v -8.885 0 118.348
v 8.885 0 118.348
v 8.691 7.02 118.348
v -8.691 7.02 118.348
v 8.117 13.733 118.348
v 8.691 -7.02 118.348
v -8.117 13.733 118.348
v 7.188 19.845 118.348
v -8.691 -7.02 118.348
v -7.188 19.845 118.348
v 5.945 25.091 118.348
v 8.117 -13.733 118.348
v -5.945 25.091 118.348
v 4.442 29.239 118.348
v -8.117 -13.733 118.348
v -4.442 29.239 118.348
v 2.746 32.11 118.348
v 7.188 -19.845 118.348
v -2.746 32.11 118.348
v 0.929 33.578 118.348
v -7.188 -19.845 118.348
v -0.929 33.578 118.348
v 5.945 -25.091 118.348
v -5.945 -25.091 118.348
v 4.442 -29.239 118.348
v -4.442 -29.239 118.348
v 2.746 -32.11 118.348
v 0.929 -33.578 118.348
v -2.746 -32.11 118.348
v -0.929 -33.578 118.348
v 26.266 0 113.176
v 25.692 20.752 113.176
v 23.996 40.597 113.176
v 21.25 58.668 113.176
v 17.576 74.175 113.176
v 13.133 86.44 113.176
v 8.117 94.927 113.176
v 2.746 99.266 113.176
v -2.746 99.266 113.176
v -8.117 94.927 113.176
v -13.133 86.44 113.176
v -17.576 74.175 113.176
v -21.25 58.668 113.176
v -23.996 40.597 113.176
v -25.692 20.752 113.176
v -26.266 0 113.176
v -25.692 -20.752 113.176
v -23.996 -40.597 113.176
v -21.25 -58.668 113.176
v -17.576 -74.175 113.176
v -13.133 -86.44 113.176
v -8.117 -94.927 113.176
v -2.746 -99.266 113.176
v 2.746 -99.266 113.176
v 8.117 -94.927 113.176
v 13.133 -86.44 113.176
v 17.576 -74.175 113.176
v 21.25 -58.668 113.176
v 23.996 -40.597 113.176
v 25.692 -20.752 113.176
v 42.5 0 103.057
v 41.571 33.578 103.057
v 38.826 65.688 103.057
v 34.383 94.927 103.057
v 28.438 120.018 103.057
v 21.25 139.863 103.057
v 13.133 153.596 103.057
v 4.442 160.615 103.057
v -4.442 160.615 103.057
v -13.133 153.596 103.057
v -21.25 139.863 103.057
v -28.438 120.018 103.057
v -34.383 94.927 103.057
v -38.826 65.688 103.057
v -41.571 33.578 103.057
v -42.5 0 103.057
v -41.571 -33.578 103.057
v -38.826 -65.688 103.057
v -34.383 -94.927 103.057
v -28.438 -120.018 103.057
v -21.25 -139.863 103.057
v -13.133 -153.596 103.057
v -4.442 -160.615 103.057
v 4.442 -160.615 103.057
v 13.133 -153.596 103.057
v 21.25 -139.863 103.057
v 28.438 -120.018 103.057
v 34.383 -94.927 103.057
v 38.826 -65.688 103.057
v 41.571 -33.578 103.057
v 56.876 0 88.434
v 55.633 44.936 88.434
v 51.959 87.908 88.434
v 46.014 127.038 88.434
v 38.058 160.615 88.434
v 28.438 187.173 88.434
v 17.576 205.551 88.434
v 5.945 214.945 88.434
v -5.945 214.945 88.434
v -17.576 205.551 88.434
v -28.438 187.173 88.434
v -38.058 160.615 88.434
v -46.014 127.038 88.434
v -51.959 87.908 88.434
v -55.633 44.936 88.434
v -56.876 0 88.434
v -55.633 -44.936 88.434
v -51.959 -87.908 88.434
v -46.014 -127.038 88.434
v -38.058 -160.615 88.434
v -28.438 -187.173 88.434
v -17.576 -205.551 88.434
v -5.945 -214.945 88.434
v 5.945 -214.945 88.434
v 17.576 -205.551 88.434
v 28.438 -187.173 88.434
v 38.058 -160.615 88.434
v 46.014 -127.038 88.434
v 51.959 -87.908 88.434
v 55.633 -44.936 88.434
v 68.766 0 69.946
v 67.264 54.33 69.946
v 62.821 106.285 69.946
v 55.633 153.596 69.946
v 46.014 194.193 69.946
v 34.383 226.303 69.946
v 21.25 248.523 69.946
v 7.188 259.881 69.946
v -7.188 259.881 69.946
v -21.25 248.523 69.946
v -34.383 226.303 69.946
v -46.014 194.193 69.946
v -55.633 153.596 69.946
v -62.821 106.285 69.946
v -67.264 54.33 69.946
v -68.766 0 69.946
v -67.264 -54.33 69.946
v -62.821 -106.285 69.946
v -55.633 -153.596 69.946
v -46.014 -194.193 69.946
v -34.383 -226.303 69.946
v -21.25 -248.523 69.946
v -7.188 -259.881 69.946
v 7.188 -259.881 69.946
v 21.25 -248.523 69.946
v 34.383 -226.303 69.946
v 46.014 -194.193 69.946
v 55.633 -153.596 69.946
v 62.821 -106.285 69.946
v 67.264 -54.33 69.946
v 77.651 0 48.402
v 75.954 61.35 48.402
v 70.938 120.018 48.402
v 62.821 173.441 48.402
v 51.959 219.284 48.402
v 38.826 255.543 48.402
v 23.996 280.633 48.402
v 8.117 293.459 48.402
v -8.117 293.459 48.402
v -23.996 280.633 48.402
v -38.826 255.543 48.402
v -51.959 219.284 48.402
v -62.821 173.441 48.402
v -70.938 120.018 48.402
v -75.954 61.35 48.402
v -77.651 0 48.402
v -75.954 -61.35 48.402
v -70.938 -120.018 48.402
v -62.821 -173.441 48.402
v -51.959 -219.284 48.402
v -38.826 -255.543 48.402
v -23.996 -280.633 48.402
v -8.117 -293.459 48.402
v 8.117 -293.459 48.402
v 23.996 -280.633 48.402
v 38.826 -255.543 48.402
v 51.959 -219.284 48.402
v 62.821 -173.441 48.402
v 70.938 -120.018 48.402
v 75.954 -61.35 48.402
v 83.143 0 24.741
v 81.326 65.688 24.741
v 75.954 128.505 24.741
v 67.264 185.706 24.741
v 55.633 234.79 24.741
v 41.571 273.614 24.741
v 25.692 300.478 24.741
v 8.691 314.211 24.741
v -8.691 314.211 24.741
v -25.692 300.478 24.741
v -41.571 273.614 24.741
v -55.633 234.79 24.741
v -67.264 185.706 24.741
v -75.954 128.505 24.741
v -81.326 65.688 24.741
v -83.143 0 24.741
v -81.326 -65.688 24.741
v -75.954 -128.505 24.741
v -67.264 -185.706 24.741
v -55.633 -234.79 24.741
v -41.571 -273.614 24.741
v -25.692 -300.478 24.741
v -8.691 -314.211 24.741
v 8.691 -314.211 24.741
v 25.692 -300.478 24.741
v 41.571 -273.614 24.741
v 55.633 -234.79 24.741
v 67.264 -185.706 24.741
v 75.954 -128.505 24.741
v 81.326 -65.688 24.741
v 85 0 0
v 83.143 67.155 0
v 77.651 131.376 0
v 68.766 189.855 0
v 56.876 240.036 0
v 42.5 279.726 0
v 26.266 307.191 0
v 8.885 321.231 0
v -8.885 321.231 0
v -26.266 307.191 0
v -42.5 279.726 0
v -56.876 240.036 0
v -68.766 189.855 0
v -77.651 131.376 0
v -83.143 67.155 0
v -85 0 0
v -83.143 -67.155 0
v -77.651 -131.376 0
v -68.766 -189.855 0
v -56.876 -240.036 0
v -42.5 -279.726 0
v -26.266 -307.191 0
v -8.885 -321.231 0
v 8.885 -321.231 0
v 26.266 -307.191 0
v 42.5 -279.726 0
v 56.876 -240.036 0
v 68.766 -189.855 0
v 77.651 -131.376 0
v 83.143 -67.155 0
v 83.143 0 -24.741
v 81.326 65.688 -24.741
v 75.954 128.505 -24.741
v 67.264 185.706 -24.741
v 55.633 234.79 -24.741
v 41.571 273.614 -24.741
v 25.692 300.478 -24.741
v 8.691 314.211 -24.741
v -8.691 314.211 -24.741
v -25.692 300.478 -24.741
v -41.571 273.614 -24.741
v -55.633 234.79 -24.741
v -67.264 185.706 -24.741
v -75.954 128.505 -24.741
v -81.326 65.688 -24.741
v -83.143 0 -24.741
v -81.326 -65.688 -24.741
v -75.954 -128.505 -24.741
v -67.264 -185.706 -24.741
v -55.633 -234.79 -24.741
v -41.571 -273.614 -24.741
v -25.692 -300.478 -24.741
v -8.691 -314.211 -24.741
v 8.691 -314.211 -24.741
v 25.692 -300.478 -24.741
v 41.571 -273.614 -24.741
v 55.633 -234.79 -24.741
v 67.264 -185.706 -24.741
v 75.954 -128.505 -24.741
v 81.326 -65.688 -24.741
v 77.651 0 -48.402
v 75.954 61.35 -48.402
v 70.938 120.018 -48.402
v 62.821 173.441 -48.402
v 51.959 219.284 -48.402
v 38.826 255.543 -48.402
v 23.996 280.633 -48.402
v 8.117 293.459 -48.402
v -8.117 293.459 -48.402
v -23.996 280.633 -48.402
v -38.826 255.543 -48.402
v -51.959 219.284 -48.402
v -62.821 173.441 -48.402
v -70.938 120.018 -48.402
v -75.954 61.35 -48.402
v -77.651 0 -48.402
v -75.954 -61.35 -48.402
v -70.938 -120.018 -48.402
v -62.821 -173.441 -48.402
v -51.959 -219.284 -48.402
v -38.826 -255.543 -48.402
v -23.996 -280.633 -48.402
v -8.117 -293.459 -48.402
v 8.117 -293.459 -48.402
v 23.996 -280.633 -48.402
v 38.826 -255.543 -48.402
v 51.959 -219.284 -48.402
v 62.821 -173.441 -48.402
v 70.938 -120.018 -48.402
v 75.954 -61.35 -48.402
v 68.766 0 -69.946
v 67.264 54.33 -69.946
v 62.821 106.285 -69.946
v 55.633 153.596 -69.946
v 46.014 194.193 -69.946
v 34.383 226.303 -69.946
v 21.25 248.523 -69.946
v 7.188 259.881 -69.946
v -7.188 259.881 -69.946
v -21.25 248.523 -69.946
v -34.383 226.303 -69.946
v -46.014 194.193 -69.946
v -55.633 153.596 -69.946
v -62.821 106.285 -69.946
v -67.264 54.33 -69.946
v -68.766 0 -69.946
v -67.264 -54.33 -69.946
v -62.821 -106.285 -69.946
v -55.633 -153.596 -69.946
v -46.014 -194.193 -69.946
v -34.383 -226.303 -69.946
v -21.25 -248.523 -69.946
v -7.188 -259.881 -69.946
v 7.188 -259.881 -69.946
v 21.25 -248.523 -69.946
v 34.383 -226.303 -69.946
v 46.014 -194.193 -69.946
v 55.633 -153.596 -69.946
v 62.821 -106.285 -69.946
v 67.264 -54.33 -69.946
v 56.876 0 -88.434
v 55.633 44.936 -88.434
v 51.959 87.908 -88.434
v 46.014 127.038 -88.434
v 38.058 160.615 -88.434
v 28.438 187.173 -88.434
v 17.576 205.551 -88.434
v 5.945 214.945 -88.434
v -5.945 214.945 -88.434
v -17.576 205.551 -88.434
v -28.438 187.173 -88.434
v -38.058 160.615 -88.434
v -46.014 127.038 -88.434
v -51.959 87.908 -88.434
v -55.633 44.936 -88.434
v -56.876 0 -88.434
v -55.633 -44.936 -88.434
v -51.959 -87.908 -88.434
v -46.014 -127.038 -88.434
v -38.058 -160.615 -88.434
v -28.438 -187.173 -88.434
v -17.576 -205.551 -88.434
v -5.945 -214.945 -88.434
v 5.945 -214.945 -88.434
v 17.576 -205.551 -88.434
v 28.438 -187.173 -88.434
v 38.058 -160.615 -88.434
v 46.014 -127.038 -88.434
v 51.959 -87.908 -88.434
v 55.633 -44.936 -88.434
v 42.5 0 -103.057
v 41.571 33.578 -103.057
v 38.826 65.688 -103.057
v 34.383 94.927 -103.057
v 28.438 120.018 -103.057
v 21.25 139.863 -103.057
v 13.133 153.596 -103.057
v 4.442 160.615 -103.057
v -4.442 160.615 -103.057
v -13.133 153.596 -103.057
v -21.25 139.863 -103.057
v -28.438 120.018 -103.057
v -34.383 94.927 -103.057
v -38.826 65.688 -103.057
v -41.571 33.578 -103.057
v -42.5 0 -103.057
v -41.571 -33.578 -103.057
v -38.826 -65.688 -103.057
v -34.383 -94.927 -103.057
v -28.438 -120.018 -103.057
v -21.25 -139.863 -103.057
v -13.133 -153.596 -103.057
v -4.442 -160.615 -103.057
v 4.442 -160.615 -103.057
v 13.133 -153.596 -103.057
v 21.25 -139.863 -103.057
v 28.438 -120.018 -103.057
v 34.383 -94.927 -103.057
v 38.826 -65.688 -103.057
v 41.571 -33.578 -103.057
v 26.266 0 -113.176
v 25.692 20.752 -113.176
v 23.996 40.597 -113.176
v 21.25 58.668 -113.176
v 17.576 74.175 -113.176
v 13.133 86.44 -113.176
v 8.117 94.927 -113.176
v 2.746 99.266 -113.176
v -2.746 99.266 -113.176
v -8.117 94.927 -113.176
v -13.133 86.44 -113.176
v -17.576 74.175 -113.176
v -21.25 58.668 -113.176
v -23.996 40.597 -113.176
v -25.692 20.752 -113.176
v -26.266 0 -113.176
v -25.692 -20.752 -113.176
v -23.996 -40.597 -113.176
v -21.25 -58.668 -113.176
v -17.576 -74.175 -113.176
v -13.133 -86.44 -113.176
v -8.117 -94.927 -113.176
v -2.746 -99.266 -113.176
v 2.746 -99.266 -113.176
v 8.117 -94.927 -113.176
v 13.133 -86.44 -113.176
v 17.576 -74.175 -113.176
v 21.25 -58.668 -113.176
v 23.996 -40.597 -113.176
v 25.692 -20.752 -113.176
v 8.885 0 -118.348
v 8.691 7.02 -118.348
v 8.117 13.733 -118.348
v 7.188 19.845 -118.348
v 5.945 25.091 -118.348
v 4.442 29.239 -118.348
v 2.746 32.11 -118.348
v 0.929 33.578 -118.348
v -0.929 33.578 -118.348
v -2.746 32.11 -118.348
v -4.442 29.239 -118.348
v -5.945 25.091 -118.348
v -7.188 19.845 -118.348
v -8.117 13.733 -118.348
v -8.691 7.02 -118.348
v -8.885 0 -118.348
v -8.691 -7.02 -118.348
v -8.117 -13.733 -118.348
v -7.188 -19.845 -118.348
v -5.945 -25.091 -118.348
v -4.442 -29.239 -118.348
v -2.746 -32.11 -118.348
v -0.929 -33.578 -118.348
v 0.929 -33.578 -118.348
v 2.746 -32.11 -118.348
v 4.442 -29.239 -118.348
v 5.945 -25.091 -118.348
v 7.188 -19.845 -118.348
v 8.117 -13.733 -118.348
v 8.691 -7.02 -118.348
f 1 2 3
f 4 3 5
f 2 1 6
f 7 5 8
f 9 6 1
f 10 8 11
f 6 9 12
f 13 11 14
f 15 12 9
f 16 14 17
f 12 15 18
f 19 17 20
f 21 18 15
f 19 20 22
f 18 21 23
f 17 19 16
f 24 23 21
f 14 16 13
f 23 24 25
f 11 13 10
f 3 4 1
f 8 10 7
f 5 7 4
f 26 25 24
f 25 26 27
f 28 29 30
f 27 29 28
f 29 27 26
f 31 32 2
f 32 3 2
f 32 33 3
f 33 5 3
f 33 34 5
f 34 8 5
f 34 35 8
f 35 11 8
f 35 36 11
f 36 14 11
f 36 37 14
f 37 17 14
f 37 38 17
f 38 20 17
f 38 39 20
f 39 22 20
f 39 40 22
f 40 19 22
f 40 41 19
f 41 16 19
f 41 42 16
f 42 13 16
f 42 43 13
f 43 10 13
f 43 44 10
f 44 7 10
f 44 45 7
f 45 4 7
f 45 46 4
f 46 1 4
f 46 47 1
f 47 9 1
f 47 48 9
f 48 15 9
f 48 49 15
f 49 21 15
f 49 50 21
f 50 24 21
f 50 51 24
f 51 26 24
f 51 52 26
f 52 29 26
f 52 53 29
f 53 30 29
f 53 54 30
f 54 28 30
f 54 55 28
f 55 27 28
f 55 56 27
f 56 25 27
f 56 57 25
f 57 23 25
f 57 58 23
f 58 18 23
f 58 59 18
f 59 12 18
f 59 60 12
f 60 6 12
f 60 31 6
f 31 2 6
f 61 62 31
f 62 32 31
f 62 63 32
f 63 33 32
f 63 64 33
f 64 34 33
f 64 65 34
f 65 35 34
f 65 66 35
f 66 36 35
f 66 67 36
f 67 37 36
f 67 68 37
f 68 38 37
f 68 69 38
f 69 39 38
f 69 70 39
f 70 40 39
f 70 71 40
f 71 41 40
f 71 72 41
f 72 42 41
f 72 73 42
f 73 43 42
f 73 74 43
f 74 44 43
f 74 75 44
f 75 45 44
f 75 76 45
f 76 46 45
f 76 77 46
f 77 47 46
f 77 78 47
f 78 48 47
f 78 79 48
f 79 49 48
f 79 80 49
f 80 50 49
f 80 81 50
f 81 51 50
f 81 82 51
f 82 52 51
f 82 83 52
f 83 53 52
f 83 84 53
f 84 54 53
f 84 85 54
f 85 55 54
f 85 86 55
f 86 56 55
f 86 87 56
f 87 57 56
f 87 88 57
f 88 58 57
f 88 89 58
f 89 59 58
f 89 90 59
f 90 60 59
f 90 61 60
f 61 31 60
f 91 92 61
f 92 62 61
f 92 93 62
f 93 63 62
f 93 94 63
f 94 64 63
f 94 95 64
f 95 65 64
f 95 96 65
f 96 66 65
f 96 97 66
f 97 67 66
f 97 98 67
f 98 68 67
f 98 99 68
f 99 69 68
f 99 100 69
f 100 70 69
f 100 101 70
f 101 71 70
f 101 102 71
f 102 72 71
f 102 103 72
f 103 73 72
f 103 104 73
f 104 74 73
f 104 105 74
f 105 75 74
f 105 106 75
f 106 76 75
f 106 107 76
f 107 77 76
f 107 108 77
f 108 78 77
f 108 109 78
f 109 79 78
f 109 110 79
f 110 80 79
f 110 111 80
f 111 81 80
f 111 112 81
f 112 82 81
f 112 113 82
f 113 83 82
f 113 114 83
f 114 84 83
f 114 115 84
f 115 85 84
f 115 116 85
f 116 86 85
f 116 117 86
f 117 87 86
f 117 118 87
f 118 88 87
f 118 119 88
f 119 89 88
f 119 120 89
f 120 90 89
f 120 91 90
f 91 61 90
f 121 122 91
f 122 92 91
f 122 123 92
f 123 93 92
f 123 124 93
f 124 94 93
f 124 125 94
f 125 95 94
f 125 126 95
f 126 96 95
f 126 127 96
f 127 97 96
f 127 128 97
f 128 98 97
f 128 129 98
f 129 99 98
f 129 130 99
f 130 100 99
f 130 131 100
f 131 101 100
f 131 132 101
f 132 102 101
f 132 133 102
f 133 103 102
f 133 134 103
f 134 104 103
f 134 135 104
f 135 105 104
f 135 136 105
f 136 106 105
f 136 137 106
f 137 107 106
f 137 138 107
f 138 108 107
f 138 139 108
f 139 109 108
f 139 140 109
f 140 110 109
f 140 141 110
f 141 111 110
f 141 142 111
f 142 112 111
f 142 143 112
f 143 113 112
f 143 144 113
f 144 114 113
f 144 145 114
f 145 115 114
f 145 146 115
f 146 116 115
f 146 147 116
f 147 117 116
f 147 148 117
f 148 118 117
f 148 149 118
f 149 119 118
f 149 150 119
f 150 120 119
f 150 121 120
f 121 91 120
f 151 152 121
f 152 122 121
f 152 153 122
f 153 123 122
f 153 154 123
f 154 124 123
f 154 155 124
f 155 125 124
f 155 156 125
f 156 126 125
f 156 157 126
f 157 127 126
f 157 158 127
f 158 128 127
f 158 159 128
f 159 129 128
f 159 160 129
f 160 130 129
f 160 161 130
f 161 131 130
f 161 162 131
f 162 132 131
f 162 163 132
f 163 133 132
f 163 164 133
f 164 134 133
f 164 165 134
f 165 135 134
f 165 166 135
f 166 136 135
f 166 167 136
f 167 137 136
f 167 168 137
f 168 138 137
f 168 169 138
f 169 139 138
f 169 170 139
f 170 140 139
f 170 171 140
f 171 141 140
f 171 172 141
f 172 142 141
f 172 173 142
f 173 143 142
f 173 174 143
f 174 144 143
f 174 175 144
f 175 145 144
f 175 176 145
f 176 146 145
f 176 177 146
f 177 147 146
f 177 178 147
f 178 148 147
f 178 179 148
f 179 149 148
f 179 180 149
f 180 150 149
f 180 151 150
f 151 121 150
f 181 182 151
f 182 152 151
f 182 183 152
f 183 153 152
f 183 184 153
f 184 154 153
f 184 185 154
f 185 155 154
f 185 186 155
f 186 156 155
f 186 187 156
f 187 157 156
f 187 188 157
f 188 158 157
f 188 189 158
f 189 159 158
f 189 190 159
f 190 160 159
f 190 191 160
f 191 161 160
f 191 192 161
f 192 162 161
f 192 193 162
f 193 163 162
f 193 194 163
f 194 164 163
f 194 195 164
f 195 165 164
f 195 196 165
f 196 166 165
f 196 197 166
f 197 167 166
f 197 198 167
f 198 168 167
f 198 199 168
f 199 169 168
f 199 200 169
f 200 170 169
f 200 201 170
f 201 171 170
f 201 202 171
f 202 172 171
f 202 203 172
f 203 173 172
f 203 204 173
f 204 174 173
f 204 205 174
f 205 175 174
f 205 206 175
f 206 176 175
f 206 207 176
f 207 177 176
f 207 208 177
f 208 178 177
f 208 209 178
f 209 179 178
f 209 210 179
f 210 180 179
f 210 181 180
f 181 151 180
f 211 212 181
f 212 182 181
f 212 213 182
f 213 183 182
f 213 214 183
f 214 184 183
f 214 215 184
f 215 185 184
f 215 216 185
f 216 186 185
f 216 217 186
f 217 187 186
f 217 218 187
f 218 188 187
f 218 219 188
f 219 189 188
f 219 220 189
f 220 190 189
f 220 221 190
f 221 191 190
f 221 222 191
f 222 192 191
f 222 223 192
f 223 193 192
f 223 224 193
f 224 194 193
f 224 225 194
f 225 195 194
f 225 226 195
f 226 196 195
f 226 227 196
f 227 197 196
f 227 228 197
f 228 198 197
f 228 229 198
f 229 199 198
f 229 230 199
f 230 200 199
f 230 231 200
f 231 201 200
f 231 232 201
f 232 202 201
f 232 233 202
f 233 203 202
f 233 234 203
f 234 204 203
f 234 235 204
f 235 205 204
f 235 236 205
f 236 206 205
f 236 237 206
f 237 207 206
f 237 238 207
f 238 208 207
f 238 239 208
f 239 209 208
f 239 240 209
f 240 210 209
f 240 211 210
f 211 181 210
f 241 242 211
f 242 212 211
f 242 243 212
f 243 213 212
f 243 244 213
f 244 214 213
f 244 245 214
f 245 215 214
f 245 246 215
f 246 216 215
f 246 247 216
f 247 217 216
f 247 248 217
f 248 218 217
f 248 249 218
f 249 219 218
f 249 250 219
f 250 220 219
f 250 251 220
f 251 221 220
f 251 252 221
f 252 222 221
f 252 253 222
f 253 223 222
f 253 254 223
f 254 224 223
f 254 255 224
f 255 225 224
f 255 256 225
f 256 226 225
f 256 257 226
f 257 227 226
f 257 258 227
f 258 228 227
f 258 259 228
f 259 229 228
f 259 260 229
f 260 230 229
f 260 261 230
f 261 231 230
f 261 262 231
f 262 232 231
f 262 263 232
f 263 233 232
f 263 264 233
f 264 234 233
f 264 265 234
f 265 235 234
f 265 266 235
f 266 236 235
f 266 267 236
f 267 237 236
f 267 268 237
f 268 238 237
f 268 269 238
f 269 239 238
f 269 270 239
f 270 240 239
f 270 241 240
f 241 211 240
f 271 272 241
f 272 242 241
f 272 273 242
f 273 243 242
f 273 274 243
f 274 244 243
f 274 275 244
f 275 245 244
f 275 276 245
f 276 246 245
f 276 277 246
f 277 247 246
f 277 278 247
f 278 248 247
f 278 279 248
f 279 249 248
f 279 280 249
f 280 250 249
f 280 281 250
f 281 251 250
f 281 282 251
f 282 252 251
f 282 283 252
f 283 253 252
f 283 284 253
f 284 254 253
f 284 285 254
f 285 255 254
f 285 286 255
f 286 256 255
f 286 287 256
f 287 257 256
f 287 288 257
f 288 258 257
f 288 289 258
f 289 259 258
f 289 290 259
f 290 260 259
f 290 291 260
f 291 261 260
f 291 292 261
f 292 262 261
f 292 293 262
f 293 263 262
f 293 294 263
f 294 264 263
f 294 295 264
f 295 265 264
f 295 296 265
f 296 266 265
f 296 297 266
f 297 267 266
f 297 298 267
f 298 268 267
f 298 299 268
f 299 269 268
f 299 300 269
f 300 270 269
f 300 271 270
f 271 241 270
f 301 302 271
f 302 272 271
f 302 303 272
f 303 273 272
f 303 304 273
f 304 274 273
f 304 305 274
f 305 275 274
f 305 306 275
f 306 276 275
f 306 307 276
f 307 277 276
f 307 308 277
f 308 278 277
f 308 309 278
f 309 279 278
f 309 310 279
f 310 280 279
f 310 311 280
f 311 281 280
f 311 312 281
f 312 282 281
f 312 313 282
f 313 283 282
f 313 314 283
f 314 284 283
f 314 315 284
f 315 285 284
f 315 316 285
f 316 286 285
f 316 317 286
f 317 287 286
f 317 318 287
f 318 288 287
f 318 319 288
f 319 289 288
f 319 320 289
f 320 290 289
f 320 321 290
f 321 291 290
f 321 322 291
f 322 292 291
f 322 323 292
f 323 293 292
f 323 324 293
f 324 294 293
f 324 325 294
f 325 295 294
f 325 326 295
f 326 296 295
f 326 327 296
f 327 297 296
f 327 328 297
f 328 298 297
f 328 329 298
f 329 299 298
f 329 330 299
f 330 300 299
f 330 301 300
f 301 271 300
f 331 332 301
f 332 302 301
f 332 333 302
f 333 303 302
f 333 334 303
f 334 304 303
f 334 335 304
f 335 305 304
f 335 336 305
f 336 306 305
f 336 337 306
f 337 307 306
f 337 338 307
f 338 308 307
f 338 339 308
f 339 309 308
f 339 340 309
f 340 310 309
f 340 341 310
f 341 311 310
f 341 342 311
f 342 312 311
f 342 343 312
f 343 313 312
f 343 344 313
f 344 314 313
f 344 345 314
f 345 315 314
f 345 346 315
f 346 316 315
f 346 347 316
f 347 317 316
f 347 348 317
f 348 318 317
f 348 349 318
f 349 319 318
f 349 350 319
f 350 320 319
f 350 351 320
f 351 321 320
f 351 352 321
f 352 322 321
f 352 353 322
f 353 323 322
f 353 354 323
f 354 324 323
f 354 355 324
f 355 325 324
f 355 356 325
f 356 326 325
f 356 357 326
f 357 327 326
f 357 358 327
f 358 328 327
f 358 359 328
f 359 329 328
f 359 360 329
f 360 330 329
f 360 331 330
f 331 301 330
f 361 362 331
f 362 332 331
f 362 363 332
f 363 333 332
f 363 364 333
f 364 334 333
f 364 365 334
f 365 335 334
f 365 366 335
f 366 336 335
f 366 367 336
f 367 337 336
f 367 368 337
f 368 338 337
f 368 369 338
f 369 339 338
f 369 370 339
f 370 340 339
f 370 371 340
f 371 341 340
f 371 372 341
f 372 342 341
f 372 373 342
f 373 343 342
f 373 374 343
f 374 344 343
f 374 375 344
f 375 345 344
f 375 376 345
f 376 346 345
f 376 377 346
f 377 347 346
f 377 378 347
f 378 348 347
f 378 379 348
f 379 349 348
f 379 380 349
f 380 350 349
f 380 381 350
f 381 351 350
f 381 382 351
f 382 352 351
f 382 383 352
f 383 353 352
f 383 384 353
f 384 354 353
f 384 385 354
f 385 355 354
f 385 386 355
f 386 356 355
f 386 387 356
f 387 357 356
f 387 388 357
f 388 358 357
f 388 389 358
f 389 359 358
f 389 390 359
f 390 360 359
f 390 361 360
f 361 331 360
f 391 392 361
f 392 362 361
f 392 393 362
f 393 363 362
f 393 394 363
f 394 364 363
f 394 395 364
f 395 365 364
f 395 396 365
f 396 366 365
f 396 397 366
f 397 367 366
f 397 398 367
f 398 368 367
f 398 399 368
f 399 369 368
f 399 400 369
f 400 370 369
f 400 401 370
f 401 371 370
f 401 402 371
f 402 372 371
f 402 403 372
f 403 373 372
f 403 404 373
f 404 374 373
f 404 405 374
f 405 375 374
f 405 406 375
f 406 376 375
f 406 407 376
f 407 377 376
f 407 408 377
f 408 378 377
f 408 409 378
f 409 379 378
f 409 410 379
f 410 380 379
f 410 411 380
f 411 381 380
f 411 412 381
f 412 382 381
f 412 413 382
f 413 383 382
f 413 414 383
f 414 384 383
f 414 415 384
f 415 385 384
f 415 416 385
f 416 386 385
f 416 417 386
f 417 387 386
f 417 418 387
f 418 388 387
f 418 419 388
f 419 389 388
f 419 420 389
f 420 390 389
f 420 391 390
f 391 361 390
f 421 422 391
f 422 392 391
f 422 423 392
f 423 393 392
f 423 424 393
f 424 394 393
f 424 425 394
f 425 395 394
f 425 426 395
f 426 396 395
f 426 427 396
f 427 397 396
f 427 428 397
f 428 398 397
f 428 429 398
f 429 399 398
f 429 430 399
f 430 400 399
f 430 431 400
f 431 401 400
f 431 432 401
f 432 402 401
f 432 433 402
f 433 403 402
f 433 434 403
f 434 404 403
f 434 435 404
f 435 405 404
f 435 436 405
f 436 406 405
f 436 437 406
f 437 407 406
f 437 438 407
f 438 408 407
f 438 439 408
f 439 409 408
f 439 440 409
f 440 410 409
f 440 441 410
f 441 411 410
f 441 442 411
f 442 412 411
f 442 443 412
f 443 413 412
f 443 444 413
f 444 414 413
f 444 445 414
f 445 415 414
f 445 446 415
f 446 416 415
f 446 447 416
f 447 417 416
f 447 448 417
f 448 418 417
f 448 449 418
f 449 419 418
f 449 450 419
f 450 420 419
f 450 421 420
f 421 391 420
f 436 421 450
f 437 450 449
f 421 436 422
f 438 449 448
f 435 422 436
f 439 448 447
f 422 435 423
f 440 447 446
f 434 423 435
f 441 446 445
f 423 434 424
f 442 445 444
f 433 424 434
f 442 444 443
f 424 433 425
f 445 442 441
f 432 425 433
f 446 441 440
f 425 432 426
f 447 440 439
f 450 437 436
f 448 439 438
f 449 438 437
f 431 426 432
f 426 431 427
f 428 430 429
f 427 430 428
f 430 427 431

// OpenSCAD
// Generated by SolidPython 1.0.1 on 2020-07-29 00:46:47


scale(v = [5, 19, 7]) {
	sphere(r = 17);
}
/***********************************************
*********      SolidPython code:      **********
************************************************
 
# import packages: SolidPython
from solid import *
from solid.utils import *
from itertools import chain, combinations, permutations


class Resize:

    def __init__(self, scad_file):
        self.scad_file = scad_file
        #self.scad_file = import_scad(scad_file)
        # cone/cylinder param:
        self.r1 = 0
        self.r2 = 0
        self.h = 0
        # rectangular prism param:
        self.w = 0
        self.l = 0
        # ellipse param:
        self.r = 0

    # import OpenScad code (file name corresponds to shape)


    # classify shape + parameters
    def assign(self, param1, param2, param3):
        if self.scad_file == 'cone.scad':
            self.r1 = param1
            self.r2 = param2
            self.h = param3
        elif self.scad_file == 'cylinder.scad':
            self.r1 = param1
            self.r2 = param2
            self.h = param3
        elif self.scad_file == 'rectangularPrism.scad':
            self.h = param1
            self.l = param2
            self.w = param3
        else:
            self.r = param1
            self.h = param2

    # resize parameters
    def iterate(self):
        x = range(3, 20, 2)
        i = 1
        if self.scad_file == 'cone.scad':
            tempList = list(permutations(x, 2))
            for temp in tempList:
                param1 = temp[0]
                param2 = temp[1]
                filepath = 'produced_scad_files/' + 'cone' + str(param1) + '_' + str(param2) + '_' + '.scad'
                scad_render_to_file(cylinder(h=param1, r1=param2, r2=0), filepath)

        elif self.scad_file == 'cylinder.scad':
            tempList = list(permutations(x, 3))
            for temp in tempList:
                param1 = temp[0]
                param2 = temp[1]
                filepath = 'produced_scad_files/' + 'cylinder' + str(param1) + '_' + str(param2) + '_' + '.scad'
                scad_render_to_file(cylinder(h=param1, r1=param2, r2=param2), filepath)

        elif self.scad_file == 'rectangularPrism.scad':
            tempList = list(permutations(x, 3))
            for temp in tempList:
                param1 = temp[0]
                param2 = temp[1]
                param3 = temp[2]
                filepath = 'produced_scad_files/' + 'rectangularPrism' + str(param1) + '_' + str(param2) + '_' + str(
                    param3) + '.scad'
                scad_render_to_file(cube(size=(param1, param2, param3)), filepath)

        elif self.scad_file == 'ellipse.scad':
            tempList = list(permutations(x, 4))
            for temp in tempList:
                param1 = temp[0]
                param2 = temp[1]
                param3 = temp[2]
                param4 = temp[3]
                filepath = 'produced_scad_files/' + 'ellipse' + str(param1) + '_' + str(param2) + '_' + str(param3) + '_' + str(param4) + '.scad'
                scad_render_to_file(scale([param1, param2, param3])(sphere(r=param4)), filepath)

    def render_to_scadfile(self):
        scad_render_to_file(scad, 'example.scad') 
 
************************************************/
